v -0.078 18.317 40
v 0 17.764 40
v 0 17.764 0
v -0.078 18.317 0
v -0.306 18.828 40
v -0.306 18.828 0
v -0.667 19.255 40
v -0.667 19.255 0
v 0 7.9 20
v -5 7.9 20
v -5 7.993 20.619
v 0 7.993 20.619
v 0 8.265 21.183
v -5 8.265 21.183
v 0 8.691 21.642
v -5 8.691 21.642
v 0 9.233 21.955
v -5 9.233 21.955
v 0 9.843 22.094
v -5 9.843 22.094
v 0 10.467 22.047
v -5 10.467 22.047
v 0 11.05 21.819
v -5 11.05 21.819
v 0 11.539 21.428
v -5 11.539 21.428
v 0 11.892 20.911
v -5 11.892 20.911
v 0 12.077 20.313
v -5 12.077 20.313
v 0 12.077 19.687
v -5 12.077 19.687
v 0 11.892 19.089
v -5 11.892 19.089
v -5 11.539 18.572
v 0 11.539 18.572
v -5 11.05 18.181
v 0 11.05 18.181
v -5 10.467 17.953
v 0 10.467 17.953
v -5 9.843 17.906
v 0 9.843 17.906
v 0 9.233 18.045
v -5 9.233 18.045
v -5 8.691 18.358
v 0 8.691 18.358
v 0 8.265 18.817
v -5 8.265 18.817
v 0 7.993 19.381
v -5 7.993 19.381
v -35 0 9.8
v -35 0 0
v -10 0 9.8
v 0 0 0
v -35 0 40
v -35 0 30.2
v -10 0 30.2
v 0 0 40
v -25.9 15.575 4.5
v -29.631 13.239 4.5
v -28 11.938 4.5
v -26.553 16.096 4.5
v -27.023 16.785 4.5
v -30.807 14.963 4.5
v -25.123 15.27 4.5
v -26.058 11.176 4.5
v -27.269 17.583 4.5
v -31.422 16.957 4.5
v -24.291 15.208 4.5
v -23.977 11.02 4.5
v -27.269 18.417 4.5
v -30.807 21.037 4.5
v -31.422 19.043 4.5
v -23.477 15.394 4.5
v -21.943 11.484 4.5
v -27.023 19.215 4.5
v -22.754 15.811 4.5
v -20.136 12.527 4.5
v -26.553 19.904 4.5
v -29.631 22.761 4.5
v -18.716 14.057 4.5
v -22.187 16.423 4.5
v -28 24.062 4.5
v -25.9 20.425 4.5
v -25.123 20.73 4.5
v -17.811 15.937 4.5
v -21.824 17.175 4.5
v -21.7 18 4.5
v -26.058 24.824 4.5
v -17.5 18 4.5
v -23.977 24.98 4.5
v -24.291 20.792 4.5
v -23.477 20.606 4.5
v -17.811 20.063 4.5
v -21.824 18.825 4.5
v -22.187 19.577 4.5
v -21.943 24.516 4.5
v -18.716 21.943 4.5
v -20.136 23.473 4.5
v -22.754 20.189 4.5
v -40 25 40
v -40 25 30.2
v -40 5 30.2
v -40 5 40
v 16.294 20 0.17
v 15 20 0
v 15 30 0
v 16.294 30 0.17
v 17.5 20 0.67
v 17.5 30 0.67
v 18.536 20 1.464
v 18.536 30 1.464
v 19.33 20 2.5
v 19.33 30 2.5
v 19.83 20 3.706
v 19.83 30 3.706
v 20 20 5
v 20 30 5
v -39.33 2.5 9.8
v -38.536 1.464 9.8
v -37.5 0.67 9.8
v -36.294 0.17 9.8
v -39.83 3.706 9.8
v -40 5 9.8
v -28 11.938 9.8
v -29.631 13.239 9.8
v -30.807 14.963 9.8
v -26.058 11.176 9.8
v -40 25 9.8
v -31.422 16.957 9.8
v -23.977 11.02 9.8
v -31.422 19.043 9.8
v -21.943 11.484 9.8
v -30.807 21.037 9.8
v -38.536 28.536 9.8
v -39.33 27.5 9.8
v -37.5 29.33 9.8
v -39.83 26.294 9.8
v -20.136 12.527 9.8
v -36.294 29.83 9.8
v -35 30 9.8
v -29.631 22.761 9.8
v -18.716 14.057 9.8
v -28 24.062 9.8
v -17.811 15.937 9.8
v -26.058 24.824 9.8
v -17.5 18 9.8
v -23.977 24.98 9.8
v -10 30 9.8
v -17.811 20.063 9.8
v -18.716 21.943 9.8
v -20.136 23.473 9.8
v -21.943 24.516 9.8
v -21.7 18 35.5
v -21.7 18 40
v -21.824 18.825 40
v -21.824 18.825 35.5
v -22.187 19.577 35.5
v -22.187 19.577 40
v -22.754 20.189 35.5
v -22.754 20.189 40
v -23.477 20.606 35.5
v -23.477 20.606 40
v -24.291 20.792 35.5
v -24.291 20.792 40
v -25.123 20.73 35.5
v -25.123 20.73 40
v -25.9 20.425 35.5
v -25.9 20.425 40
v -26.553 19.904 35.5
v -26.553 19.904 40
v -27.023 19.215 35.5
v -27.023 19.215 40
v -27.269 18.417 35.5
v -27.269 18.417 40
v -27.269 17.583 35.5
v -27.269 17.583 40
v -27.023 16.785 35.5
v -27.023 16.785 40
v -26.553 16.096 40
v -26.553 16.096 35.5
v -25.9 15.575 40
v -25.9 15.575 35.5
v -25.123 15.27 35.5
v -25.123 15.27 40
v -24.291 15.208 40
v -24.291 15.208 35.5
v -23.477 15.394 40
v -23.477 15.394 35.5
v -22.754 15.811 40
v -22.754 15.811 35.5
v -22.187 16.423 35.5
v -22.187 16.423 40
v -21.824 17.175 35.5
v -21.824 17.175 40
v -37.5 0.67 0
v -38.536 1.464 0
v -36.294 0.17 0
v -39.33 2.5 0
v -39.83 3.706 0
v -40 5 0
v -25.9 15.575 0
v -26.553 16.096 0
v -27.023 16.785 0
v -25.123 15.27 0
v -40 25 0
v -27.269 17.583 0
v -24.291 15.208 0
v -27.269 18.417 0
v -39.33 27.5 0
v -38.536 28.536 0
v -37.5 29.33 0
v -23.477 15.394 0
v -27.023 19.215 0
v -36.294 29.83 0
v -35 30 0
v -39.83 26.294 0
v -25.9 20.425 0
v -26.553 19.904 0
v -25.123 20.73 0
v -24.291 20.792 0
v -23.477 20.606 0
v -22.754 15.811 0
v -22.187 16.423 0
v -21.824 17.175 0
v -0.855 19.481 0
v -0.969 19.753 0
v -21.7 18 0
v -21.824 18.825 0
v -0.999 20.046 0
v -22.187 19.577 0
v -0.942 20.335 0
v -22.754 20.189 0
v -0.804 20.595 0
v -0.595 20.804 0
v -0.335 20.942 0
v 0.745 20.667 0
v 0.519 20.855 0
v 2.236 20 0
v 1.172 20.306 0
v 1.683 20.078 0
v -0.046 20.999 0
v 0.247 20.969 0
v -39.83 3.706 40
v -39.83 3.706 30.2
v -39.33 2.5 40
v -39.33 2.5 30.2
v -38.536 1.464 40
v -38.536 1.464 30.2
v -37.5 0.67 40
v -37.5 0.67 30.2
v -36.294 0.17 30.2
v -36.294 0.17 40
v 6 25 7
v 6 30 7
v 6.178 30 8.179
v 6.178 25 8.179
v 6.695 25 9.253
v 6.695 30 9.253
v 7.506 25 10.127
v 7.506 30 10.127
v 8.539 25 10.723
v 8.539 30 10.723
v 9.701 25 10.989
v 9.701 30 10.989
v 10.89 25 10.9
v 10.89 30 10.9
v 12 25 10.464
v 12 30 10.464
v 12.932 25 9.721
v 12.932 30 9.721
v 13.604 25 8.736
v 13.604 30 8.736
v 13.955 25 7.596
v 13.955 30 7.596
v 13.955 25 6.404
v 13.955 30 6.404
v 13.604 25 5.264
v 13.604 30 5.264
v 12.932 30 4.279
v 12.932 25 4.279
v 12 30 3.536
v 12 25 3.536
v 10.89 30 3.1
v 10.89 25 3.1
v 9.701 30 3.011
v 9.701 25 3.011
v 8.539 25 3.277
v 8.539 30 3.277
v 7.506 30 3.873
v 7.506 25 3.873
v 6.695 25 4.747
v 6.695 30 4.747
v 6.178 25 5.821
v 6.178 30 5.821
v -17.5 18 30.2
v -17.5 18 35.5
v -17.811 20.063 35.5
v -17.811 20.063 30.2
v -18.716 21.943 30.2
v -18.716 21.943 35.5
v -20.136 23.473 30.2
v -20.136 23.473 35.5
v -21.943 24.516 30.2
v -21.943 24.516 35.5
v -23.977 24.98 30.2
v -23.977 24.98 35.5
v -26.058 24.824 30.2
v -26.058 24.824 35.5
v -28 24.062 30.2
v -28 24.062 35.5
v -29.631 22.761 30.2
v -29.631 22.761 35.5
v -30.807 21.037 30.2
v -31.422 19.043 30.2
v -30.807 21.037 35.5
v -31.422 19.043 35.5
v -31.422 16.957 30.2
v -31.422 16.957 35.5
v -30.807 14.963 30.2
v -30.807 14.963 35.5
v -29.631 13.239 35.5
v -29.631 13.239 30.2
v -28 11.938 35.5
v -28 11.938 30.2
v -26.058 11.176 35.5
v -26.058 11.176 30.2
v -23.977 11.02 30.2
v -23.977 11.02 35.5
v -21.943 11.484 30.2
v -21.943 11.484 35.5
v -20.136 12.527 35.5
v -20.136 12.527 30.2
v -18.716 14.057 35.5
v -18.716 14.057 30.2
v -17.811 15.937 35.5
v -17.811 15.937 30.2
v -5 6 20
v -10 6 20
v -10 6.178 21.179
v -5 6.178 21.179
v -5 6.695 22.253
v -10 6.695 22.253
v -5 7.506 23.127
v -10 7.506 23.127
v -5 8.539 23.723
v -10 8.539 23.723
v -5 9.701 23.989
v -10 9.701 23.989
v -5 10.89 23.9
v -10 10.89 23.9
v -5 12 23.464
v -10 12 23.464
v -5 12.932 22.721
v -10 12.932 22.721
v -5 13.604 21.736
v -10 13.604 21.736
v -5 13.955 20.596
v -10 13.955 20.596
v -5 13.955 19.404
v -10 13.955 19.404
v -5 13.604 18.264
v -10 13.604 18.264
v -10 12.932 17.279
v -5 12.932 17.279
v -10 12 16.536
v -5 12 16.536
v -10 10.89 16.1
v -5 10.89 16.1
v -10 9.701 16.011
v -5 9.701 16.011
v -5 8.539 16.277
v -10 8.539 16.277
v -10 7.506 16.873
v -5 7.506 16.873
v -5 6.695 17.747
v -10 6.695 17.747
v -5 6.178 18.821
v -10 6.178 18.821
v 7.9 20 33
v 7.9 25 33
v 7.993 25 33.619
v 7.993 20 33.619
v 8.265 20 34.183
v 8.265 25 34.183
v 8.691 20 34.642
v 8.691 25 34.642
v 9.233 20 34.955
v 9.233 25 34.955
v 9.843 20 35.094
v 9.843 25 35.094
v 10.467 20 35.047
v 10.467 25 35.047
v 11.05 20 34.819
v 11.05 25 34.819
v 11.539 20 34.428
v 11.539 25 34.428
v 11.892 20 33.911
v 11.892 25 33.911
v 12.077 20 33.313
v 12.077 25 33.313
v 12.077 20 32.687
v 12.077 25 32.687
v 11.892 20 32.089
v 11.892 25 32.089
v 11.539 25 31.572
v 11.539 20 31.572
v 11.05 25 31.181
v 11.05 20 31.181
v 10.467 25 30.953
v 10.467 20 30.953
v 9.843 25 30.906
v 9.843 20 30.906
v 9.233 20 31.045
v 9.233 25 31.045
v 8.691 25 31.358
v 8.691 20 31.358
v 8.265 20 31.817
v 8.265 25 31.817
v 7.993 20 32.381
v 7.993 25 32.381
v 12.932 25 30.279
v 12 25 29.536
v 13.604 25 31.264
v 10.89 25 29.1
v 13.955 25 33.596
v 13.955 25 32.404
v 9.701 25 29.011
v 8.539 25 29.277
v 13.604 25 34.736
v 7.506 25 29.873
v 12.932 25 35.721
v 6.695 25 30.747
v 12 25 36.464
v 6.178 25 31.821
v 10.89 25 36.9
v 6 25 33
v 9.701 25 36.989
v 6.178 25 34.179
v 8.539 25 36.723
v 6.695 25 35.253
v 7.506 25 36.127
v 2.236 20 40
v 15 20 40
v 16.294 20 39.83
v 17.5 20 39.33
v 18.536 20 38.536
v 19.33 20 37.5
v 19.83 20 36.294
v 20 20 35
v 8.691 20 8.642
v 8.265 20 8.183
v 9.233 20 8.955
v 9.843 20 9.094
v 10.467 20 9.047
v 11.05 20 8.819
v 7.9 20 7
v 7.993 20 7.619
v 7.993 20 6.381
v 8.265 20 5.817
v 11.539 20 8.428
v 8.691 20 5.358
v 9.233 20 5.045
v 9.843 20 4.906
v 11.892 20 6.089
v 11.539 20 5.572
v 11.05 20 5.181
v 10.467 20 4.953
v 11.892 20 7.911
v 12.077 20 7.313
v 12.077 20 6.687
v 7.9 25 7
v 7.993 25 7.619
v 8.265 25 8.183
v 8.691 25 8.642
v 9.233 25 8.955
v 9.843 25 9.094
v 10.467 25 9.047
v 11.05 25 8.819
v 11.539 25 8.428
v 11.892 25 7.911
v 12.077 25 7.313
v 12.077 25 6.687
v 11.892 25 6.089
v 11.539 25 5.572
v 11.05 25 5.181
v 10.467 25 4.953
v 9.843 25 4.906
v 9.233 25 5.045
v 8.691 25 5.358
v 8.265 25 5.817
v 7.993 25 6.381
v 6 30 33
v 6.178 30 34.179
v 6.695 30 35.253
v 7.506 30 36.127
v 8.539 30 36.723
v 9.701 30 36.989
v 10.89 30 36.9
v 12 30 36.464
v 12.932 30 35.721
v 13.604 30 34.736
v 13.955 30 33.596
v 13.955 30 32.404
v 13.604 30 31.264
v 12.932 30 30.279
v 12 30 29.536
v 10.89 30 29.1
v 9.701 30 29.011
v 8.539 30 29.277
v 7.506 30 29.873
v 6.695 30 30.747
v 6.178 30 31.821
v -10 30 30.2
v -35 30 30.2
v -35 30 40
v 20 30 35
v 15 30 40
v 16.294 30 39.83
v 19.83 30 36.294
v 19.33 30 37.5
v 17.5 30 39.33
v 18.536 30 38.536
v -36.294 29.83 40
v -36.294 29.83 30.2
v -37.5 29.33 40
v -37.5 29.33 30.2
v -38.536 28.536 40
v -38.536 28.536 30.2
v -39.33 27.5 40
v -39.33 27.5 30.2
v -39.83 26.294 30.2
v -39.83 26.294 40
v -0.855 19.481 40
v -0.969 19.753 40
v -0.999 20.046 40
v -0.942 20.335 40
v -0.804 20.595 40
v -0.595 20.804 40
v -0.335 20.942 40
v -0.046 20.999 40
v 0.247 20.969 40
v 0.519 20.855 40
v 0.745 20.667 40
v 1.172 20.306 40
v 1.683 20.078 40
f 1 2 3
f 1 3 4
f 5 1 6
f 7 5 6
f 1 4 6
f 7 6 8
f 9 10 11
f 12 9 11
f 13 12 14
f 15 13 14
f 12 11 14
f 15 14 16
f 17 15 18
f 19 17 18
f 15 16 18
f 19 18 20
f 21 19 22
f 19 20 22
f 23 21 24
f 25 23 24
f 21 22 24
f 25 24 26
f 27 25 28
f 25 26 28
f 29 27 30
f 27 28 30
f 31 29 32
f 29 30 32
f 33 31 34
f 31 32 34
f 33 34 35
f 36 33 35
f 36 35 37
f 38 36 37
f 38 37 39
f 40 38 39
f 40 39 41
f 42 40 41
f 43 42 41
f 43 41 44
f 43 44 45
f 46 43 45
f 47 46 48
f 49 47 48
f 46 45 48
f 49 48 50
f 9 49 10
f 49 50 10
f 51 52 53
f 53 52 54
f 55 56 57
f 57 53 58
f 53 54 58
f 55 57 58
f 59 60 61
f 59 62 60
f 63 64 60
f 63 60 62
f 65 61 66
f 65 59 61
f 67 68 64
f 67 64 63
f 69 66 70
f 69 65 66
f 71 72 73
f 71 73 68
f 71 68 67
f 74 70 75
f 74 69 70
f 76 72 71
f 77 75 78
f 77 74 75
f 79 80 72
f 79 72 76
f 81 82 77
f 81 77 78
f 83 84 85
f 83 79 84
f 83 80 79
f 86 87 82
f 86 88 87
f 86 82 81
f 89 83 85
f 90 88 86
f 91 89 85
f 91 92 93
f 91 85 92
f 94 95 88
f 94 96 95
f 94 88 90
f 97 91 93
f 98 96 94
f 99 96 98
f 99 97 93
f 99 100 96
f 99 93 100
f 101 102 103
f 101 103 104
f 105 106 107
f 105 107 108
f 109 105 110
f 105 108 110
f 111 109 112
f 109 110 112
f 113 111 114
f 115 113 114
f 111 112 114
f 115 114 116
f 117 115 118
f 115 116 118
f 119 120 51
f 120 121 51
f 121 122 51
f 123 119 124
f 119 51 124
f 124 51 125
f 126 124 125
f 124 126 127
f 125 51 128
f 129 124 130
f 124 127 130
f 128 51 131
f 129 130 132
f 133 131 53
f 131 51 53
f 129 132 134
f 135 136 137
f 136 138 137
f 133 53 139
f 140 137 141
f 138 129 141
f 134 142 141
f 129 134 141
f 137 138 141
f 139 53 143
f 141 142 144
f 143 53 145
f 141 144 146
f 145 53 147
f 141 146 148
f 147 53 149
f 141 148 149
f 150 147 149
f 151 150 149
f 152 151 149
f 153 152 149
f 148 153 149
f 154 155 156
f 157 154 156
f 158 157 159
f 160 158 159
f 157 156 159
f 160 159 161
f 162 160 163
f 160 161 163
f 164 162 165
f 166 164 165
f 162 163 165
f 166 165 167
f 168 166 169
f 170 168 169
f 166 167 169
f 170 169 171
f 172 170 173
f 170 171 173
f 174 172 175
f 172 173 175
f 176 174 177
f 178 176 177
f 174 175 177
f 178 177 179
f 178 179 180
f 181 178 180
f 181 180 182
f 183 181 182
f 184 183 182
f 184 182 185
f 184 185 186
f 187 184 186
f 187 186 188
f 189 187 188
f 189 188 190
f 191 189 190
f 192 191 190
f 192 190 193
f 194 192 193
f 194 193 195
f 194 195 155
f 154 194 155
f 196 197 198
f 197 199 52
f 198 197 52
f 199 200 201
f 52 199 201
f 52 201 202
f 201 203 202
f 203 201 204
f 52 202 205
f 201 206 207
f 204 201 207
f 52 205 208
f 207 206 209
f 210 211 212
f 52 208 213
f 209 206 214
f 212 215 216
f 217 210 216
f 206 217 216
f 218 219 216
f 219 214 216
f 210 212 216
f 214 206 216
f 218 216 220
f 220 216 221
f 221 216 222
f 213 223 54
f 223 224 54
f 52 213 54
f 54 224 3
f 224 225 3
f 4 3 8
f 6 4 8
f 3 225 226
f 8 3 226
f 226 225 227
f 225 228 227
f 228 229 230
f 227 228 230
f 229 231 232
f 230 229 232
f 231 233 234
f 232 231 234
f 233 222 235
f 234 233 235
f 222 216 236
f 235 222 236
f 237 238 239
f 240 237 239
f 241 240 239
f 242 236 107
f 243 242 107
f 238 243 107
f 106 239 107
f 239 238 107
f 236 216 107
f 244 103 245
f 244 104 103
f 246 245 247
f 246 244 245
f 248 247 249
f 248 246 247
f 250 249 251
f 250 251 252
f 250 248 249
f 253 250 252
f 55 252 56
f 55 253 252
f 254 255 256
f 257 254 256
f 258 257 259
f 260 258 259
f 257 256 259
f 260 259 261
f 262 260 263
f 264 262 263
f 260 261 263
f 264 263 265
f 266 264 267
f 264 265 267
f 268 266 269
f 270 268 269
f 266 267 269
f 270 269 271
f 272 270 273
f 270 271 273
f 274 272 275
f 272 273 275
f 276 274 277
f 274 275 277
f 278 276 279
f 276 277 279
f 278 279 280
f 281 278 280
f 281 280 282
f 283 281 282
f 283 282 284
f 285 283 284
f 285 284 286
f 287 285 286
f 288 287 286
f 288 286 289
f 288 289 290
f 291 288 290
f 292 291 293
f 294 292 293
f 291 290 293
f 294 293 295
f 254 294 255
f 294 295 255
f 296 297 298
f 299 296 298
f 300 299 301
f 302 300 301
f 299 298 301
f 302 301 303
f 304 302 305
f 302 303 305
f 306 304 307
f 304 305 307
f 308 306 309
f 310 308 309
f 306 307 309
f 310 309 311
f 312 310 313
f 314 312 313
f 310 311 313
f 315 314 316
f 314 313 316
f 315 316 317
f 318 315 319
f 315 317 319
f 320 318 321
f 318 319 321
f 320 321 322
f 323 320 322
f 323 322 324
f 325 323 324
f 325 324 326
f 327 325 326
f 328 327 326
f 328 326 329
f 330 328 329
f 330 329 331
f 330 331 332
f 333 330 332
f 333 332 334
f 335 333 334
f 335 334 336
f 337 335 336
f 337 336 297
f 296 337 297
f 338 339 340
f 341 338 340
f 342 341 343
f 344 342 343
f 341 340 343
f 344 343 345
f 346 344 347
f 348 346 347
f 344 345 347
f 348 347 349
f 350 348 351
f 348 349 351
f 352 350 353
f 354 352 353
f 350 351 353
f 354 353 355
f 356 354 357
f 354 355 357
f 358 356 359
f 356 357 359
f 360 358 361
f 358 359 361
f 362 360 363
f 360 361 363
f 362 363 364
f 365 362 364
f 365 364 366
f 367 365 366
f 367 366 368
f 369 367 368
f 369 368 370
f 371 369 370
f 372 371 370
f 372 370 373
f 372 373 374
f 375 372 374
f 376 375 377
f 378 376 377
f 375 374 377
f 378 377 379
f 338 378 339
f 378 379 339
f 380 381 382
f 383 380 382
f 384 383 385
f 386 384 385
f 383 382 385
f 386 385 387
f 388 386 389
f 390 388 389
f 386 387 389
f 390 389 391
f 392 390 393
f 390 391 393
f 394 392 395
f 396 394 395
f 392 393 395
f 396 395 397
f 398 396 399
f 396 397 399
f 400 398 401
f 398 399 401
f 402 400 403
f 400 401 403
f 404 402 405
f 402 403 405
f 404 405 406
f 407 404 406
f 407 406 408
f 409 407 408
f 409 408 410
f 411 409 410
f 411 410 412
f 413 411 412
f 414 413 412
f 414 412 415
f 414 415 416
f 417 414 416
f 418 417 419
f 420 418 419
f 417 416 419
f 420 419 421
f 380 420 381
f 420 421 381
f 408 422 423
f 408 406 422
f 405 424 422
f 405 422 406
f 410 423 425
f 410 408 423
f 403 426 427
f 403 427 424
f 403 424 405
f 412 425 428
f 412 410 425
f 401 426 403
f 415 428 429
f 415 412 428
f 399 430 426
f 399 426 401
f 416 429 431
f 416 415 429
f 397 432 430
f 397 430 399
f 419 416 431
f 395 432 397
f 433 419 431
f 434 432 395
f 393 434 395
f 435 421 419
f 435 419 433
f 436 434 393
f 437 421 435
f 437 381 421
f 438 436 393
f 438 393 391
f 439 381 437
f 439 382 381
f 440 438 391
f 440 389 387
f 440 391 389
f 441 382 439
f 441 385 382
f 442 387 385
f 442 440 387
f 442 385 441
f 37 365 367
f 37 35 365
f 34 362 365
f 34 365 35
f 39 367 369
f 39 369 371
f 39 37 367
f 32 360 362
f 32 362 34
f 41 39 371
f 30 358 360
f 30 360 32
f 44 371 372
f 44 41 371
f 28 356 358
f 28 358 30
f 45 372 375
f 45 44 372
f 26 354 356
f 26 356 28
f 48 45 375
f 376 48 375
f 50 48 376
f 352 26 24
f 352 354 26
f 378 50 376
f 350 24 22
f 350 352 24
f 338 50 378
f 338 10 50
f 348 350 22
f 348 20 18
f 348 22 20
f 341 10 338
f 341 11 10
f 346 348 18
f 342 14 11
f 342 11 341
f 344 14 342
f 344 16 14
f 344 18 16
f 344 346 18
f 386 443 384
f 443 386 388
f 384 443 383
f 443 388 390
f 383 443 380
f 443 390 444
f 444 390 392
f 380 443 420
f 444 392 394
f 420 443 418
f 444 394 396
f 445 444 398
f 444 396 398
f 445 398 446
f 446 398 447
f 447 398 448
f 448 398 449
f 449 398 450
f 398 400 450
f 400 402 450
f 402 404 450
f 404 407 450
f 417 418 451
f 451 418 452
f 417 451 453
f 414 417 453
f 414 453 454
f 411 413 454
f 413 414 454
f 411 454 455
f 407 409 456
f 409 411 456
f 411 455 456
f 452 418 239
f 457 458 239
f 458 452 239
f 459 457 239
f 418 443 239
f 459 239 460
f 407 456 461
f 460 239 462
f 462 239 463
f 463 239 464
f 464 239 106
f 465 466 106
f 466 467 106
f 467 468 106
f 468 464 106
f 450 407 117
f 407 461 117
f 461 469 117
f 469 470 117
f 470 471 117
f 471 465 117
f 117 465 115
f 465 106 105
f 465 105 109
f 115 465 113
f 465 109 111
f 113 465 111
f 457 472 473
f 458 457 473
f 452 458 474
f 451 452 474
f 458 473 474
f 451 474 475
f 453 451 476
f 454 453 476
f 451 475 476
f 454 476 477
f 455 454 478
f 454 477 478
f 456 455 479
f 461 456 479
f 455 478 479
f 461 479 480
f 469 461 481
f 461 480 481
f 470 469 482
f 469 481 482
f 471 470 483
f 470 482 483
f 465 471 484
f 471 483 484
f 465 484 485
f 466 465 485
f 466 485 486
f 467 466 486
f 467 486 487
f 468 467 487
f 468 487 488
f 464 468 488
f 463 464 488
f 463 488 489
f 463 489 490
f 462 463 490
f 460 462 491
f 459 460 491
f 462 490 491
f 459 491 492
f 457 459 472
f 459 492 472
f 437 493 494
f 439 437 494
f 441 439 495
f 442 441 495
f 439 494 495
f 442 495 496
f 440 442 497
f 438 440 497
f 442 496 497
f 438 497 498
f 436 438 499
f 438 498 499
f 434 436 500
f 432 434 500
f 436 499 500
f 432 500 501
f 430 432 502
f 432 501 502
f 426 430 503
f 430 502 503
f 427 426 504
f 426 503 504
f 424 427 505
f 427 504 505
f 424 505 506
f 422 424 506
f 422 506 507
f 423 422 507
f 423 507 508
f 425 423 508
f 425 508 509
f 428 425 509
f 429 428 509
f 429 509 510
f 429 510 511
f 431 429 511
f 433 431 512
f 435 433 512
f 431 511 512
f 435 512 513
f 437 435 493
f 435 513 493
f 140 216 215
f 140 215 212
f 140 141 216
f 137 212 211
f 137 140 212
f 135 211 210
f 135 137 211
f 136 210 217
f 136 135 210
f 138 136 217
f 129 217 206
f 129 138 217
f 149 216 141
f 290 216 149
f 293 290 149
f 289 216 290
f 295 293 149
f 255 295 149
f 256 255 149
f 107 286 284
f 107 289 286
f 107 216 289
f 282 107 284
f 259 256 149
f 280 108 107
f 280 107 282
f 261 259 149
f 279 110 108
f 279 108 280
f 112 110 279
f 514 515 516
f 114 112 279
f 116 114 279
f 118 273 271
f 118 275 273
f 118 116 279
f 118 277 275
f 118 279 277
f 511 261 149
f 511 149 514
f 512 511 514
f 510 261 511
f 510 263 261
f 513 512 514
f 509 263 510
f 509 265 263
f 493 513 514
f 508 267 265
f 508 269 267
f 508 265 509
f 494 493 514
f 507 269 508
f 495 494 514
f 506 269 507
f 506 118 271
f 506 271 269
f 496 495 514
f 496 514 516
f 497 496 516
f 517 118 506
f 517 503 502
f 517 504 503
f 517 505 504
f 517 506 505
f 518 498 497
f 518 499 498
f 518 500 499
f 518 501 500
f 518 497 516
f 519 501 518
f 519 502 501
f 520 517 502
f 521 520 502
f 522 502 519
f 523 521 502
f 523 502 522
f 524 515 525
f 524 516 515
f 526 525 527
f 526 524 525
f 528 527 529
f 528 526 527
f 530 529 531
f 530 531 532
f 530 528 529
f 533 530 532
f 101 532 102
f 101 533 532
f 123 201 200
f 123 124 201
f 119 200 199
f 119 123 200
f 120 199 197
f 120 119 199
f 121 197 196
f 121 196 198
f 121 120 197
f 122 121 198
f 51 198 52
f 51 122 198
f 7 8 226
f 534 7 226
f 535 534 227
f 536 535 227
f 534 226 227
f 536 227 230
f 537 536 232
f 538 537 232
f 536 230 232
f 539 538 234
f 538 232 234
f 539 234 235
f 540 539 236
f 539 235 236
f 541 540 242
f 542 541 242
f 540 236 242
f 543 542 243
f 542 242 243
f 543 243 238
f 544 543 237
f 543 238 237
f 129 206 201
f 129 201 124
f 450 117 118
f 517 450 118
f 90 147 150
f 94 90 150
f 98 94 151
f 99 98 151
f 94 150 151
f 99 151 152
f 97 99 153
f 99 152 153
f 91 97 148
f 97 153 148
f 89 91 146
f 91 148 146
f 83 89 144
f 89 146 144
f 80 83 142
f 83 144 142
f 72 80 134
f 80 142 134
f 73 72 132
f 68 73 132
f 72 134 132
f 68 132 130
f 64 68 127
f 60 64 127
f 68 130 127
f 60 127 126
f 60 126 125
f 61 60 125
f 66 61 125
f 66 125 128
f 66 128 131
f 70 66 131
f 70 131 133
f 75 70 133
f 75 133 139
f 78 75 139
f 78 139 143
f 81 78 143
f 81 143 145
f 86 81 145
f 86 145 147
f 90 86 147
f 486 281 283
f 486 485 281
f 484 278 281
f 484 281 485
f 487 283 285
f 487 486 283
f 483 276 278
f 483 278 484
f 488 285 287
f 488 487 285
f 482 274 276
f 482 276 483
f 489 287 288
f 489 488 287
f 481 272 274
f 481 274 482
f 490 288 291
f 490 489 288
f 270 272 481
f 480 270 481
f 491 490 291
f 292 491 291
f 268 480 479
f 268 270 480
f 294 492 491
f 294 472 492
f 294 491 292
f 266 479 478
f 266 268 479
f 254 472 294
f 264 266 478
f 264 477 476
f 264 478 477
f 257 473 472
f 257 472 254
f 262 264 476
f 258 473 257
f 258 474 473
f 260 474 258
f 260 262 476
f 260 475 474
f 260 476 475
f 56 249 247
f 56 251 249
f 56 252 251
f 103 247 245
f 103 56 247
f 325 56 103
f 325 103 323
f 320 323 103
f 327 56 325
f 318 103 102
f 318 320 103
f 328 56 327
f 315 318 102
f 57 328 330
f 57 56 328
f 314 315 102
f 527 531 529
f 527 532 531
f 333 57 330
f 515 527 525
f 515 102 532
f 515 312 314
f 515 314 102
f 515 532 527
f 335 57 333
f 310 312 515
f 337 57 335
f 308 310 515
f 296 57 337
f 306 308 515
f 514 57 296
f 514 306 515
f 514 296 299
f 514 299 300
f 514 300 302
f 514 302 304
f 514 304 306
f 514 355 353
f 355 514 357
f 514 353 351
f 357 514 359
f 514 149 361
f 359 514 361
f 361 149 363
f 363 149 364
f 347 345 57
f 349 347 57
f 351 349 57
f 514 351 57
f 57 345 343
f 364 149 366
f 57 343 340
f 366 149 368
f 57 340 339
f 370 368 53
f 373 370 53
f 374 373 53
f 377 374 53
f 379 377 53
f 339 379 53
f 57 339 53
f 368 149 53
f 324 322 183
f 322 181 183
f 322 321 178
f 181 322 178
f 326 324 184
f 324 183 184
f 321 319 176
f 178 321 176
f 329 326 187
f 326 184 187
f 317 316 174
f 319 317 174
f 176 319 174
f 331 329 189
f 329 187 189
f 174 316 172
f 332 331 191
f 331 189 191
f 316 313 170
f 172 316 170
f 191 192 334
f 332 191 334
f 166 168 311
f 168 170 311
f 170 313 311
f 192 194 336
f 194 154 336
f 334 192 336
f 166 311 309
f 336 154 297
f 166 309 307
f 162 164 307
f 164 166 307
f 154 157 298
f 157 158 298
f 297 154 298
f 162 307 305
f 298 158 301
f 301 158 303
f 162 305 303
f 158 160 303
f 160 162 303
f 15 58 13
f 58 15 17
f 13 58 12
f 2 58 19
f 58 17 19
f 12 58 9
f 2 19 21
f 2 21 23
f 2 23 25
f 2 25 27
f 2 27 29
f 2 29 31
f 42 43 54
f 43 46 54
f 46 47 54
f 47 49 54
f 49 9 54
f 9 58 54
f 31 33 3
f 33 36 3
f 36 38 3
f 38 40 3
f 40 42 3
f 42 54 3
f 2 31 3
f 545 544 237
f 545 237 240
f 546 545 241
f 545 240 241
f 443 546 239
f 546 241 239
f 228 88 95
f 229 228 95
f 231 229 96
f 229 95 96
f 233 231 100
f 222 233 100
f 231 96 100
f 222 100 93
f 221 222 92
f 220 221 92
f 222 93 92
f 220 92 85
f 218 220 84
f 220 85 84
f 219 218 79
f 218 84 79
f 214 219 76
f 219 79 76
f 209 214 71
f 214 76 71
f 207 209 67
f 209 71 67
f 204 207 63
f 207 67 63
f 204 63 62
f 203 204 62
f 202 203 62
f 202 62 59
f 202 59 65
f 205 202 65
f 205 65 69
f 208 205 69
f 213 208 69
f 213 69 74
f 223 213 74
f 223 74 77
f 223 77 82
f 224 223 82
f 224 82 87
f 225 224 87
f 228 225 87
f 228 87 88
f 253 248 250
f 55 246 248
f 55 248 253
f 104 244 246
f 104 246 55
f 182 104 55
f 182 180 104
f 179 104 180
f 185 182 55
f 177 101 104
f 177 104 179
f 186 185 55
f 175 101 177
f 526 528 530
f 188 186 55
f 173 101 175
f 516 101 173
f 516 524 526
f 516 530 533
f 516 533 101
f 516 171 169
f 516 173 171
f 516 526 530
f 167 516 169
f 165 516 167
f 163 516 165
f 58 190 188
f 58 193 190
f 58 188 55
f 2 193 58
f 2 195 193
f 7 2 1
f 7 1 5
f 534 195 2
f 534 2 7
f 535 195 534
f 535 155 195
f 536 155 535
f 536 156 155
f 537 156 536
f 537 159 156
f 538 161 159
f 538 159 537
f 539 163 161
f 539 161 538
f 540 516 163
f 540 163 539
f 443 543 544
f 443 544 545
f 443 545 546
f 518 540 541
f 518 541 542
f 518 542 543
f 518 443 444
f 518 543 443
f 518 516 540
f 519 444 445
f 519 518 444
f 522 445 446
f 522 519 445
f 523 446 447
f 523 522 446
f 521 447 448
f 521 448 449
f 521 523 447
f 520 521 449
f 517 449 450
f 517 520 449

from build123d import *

# Parameters (mm, degrees)
DODANIE_WYCI_GNI_CIE1_DEPTH = 40
SZKIC4_W                    = 9.8
SZKIC4_H                    = 30
DODANIE_WYCI_GNI_CIE3_DEPTH = 30
SZKIC6_R                    = 7
WYTNIJ_WYCI_GNI_CIE1_DEPTH  = 65.031242374
SZKIC7_R                    = 4
WYTNIJ_WYCI_GNI_CIE2_DEPTH  = 5
SZKIC8_R                    = 2.1
WYTNIJ_WYCI_GNI_CIE3_DEPTH  = 5
SZKIC9_R                    = 4
WYTNIJ_WYCI_GNI_CIE4_DEPTH  = 5
SZKIC10_R                   = 2.1
WYTNIJ_WYCI_GNI_CIE5_DEPTH  = 5
ZAOKR_GLENIE1_R             = 5
ZAOKR_GLENIE2_R             = 5
SZKIC11_R                   = 7
DODANIE_WYCI_GNI_CIE5_DEPTH = 4.5
SZKIC12_R                   = 2.8
WYTNIJ_WYCI_GNI_CIE6_DEPTH  = 65.031242374


with BuildPart() as part:
    # Szkic1 → Dodanie-wyciągnięcie1 (new body)
    with BuildSketch(Plane.XY):
        with BuildLine():
            Line((0, 0), (0, 17.763932023))
            ThreePointArc((0, 17.763932023), (-0.174258142, 18.580428603), (-0.666666667, 19.254644008))
            ThreePointArc((-0.666666667, 19.254644008), (-0.707106781, 20.707106781), (0.745355992, 20.666666667))
            ThreePointArc((0.745355992, 20.666666667), (1.419571397, 20.174258142), (2.236067977, 20))
            Line((2.236067977, 20), (20, 20))
            Line((20, 20), (20, 30))
            Line((20, 30), (-10, 30))
            Line((-10, 30), (-10, 0))
            Line((-10, 0), (0, 0))
        make_face()
    extrude(amount=DODANIE_WYCI_GNI_CIE1_DEPTH)

    # Szkic4 → Dodanie-wyciągnięcie3 (add)
    with BuildSketch(Plane.ZY.offset(10)):
        with Locations((35.1, 15)):
            Rectangle(SZKIC4_W, SZKIC4_H)
        with Locations((4.9, 15)):
            Rectangle(SZKIC4_W, SZKIC4_H)
    extrude(amount=DODANIE_WYCI_GNI_CIE3_DEPTH)

    # Szkic6 → Wytnij-wyciągnięcie1 (cut, through all)
    with BuildSketch(Plane.XY.offset(40)):
        with Locations((-24.5, 18)):
            Circle(SZKIC6_R)
    extrude(amount=-WYTNIJ_WYCI_GNI_CIE1_DEPTH, mode=Mode.SUBTRACT)

    # Szkic7 → Wytnij-wyciągnięcie2 (cut)
    with BuildSketch(Plane.ZY.offset(10)):
        with Locations(Location((20, 10, 0), (0, 0, 270))):
            Circle(SZKIC7_R)
    extrude(amount=-WYTNIJ_WYCI_GNI_CIE2_DEPTH, mode=Mode.SUBTRACT)

    # Szkic8 → Wytnij-wyciągnięcie3 (cut)
    with BuildSketch(Plane.ZY.offset(5)):
        with Locations(Location((20, 10, 0), (0, 0, 270))):
            Circle(SZKIC8_R)
    extrude(amount=-WYTNIJ_WYCI_GNI_CIE3_DEPTH, mode=Mode.SUBTRACT)

    # Szkic9 → Wytnij-wyciągnięcie4 (cut)
    with BuildSketch(Plane(origin=(0, 30, 0), x_dir=(1, 0, 0), z_dir=(0, 1, 0))):
        with Locations(Location((10, -33, 0), (0, 0, 180))):
            Circle(SZKIC9_R)
        with Locations(Location((10, -7, 0), (0, 0, 180))):
            Circle(SZKIC9_R)
    extrude(amount=-WYTNIJ_WYCI_GNI_CIE4_DEPTH, mode=Mode.SUBTRACT)

    # Szkic10 → Wytnij-wyciągnięcie5 (cut)
    with BuildSketch(Plane(origin=(0, 25, 0), x_dir=(1, 0, 0), z_dir=(0, 1, 0))):
        with Locations(Location((10, -33, 0), (0, 0, 180))):
            Circle(SZKIC10_R)
        with Locations(Location((10, -7, 0), (0, 0, 180))):
            Circle(SZKIC10_R)
    extrude(amount=-WYTNIJ_WYCI_GNI_CIE5_DEPTH, mode=Mode.SUBTRACT)

    # Zaokrąglenie1
    zaokr_glenie1_edges = [part.edges().sort_by_distance(p)[0] for p in [
        (20, 25, 0),
        (20, 25, 40),
    ]]
    fillet(zaokr_glenie1_edges, radius=ZAOKR_GLENIE1_R)

    # Zaokrąglenie2
    zaokr_glenie2_edges = [part.edges().sort_by_distance(p)[0] for p in [
        (-40, 30, 35.1),
        (-40, 0, 35.1),
        (-40, 0, 4.9),
        (-40, 30, 4.9),
    ]]
    fillet(zaokr_glenie2_edges, radius=ZAOKR_GLENIE2_R)

    # Szkic11 → Dodanie-wyciągnięcie5 (add)
    with BuildSketch(Plane.XY.offset(40)):
        with Locations((-24.5, 18)):
            Circle(SZKIC11_R)
    dodanie_wyci_gni_cie5 = extrude(amount=-DODANIE_WYCI_GNI_CIE5_DEPTH)

    # Lustro1: Dodanie-wyciągnięcie5 across plane
    add(dodanie_wyci_gni_cie5.mirror(Plane.XY.offset(20)))

    # Szkic12 → Wytnij-wyciągnięcie6 (cut, through all)
    with BuildSketch(Plane.XY.offset(40)):
        with Locations((-24.5, 18)):
            Circle(SZKIC12_R)
    extrude(amount=-WYTNIJ_WYCI_GNI_CIE6_DEPTH, mode=Mode.SUBTRACT)


solid = part.part
